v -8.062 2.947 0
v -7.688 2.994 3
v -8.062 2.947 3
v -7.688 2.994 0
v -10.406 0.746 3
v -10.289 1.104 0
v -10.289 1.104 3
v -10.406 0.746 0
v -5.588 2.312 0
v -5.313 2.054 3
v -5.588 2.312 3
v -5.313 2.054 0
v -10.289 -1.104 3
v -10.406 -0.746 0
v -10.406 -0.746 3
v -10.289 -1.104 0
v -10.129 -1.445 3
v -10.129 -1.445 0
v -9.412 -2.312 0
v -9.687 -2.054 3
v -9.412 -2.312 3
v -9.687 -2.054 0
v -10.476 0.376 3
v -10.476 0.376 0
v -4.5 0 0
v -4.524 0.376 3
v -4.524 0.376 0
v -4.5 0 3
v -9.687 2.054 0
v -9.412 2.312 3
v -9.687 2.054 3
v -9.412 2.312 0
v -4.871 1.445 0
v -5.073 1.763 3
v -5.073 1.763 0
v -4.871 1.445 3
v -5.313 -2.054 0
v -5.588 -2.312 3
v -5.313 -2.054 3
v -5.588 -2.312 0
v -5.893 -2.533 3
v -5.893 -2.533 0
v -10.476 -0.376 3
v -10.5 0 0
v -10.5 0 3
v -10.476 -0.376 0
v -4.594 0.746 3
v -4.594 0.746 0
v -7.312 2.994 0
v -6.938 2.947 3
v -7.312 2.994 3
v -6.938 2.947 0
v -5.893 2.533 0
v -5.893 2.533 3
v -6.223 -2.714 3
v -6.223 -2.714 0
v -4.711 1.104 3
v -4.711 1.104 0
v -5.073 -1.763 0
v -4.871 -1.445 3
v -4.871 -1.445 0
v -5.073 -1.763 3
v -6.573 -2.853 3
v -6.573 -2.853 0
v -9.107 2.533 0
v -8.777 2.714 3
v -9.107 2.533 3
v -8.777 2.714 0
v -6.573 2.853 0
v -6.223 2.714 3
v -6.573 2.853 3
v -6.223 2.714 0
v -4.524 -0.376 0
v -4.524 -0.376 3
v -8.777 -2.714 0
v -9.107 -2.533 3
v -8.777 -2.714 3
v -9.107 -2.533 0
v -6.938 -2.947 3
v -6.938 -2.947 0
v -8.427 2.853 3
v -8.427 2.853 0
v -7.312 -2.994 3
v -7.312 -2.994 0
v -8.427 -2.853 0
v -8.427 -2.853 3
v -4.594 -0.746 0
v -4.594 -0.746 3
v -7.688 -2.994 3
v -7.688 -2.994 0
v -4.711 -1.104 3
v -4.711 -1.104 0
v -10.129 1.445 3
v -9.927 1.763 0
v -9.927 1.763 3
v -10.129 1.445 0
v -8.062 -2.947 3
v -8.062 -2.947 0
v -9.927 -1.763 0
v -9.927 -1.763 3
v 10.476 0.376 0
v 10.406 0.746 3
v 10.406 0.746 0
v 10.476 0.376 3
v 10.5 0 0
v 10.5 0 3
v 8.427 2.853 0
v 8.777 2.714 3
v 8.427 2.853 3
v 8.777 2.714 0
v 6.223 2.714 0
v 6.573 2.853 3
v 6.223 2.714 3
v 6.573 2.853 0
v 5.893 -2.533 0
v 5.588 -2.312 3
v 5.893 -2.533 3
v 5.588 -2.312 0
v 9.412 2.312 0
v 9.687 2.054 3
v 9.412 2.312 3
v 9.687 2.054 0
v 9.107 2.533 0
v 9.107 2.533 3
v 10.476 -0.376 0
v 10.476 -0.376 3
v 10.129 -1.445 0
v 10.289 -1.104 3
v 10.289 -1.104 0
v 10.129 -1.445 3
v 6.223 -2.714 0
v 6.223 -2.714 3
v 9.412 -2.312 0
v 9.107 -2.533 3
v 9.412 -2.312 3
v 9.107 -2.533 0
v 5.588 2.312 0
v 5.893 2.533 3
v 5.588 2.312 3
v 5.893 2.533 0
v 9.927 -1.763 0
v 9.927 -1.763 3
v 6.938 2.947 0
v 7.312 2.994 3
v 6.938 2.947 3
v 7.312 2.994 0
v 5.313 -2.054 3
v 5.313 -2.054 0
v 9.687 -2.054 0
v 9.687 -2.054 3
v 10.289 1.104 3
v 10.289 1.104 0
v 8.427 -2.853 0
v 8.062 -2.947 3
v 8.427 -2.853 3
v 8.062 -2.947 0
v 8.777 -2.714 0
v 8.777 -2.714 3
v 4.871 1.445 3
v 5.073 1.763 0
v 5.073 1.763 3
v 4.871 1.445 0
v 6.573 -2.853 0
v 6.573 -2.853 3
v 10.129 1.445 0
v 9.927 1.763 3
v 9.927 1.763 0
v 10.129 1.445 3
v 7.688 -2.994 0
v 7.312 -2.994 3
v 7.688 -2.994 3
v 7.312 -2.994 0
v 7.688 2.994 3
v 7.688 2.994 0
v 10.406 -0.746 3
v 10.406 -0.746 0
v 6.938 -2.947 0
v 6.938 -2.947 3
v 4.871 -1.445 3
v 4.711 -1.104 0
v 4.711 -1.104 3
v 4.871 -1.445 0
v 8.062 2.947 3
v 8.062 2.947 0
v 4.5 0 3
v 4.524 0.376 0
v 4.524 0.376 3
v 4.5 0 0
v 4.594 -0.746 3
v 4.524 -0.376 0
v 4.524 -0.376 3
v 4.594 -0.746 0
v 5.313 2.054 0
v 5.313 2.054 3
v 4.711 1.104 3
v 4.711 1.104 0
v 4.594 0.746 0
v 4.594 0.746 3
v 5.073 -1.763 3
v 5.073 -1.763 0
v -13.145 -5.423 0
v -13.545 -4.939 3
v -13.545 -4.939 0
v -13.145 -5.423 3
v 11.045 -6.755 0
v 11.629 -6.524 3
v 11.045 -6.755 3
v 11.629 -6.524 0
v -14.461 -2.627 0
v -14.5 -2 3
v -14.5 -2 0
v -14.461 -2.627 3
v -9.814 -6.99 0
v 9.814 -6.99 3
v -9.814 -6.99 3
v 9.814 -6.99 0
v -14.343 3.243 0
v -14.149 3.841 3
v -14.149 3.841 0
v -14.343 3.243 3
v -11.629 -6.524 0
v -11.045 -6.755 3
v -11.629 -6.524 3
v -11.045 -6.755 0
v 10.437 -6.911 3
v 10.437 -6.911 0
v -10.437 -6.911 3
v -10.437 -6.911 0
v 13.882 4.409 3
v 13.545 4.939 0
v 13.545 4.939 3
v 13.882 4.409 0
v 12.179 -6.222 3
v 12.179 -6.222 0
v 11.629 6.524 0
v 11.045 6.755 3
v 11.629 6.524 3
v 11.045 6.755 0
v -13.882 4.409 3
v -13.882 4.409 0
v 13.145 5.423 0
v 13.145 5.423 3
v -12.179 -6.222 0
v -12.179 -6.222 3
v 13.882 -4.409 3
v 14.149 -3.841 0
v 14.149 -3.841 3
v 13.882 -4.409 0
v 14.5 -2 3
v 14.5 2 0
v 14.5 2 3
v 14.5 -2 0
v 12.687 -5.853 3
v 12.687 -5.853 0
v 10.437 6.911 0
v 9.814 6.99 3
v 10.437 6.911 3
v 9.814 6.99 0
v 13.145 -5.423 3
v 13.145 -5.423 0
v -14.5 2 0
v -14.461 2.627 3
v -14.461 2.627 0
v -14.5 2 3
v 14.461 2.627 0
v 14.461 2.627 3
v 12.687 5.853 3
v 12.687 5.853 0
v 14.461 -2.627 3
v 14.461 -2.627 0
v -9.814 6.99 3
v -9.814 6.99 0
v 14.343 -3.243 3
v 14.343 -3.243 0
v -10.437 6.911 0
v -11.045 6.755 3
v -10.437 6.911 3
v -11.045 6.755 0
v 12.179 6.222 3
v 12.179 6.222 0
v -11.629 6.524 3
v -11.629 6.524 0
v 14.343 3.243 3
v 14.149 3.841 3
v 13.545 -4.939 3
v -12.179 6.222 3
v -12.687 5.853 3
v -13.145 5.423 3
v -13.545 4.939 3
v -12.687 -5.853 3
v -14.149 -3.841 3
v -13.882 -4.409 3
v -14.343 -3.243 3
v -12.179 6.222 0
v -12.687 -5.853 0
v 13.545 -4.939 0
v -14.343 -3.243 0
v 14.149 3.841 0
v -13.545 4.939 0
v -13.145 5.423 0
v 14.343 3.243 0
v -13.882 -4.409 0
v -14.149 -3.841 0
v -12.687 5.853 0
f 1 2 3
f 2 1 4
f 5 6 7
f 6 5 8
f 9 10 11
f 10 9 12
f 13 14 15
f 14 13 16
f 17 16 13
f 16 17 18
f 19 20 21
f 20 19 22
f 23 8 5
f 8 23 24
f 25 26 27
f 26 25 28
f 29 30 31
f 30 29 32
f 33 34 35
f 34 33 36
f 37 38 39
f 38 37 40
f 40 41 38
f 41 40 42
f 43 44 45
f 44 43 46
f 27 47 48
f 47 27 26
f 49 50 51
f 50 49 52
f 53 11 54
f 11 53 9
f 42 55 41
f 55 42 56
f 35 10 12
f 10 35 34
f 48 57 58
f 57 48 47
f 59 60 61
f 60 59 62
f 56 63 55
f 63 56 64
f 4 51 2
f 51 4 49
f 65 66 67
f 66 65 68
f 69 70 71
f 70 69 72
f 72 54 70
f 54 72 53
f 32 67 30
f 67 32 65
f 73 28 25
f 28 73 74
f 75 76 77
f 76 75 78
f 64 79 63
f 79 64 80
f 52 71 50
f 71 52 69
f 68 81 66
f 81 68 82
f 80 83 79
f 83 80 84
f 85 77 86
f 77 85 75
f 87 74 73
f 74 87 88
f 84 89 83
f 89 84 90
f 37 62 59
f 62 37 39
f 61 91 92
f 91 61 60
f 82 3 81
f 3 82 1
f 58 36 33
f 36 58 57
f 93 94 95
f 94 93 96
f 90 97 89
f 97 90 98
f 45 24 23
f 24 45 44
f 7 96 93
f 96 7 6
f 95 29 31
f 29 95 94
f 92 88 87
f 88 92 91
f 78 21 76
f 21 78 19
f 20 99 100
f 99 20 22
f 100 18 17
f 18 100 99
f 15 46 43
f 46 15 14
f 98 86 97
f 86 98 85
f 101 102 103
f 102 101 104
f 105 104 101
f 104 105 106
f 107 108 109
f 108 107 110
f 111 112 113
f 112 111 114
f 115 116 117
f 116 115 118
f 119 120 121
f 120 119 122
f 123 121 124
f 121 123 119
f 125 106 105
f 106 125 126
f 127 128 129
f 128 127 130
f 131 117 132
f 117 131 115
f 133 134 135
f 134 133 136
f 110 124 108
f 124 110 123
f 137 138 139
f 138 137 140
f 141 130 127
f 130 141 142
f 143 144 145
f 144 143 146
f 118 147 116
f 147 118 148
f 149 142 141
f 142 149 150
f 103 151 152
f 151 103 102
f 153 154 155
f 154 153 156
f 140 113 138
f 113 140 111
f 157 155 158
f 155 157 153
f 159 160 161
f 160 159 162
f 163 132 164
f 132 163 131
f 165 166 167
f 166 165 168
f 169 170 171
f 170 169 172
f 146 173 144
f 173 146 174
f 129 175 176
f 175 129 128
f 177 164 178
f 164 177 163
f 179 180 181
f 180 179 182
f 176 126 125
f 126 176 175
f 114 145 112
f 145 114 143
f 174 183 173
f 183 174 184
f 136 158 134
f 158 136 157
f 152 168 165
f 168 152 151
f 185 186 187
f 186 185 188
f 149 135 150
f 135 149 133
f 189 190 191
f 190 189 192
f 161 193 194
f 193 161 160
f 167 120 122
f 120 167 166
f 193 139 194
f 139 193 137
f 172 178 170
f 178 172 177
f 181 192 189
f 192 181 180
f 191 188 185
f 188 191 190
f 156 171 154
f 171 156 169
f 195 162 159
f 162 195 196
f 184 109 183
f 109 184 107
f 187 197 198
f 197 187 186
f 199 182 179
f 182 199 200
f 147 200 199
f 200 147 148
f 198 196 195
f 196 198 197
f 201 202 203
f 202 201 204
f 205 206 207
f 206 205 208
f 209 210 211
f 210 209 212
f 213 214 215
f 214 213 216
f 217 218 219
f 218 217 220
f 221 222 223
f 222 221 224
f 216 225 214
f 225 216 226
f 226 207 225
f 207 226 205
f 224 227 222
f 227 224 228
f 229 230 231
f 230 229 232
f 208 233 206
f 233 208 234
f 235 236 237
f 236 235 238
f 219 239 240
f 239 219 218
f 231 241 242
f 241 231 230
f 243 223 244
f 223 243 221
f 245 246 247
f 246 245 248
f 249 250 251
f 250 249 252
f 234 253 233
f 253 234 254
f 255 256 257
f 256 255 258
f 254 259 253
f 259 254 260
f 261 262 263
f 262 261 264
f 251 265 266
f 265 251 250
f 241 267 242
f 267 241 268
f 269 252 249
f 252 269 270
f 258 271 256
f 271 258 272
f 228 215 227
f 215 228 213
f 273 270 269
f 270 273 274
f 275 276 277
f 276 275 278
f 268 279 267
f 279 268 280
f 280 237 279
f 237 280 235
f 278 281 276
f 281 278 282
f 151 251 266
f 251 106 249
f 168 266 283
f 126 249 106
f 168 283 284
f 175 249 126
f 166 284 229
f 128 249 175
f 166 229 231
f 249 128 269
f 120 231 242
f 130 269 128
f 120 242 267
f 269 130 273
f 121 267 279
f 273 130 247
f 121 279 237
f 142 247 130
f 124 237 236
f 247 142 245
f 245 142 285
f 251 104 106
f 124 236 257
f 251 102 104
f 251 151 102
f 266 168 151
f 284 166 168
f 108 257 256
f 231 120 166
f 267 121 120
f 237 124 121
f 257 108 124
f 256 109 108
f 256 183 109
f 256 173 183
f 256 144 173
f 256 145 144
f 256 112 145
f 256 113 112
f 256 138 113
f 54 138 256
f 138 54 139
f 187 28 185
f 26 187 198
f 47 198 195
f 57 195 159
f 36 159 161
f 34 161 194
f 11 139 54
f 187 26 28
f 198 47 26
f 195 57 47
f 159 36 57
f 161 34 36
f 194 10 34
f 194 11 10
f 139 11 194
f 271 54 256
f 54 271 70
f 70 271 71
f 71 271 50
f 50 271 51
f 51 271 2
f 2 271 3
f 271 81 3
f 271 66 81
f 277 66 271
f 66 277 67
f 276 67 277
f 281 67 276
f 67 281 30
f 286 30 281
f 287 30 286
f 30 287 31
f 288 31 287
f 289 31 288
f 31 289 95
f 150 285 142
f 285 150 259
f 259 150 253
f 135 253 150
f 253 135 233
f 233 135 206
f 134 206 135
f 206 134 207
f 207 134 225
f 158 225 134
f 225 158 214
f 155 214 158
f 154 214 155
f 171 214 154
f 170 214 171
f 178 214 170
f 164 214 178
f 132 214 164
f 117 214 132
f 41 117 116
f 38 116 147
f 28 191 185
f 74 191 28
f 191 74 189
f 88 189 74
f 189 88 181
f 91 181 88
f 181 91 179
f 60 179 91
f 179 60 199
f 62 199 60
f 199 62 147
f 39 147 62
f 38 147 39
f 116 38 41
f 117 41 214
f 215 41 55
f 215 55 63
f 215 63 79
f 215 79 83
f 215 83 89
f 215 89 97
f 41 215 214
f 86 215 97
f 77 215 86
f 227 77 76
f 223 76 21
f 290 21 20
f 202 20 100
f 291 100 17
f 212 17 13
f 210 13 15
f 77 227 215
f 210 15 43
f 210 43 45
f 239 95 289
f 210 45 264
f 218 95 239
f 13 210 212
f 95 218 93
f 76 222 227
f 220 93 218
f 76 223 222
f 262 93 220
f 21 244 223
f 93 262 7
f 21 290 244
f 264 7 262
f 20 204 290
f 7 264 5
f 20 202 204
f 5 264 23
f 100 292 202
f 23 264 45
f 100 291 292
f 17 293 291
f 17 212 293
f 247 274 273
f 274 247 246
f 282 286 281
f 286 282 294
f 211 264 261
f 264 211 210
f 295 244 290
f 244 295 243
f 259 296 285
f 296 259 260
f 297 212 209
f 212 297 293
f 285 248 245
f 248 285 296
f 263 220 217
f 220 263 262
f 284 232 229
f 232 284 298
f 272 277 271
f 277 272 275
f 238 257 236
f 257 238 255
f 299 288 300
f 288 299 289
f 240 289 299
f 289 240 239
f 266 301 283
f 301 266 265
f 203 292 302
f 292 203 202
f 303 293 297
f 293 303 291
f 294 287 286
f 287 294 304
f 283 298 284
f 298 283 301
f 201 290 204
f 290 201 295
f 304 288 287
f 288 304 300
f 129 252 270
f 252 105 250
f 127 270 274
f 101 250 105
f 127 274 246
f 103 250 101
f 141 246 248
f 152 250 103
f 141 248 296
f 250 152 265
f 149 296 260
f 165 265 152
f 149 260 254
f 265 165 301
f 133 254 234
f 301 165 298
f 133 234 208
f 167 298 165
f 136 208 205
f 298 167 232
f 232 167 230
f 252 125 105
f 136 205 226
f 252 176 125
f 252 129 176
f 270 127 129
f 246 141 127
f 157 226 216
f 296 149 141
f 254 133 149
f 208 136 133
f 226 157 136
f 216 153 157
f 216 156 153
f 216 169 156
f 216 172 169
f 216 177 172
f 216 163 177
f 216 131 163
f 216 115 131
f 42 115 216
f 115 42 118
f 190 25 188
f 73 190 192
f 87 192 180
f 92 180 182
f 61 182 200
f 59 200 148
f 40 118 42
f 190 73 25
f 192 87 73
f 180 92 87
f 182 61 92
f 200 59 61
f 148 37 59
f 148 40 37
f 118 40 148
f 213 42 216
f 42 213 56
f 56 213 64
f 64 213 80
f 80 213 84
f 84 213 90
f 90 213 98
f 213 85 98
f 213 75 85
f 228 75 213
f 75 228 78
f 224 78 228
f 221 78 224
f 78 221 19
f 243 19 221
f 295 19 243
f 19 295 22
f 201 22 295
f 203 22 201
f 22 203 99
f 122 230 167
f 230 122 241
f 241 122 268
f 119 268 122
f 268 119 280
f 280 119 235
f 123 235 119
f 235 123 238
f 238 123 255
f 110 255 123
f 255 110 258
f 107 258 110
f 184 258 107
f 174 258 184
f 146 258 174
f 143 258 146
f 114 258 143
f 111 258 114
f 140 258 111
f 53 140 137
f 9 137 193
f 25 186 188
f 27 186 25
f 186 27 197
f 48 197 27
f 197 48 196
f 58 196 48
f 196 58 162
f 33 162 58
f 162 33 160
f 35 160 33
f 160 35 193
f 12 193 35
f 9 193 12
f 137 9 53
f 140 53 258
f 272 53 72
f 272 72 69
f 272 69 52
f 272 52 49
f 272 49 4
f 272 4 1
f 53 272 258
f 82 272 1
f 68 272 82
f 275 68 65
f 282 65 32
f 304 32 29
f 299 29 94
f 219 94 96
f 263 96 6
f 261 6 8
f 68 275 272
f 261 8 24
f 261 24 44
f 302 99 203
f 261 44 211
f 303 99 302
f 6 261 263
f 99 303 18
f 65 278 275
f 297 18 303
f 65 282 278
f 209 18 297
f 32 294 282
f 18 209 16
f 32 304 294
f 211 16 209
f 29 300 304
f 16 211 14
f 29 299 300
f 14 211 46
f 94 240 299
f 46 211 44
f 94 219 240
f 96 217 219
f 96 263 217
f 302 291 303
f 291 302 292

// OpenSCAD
$fn = 50;


difference() {
	union() {
		hull() {
			translate(v = [-9.5000000000, 2.0000000000, 0]) {
				cylinder(h = 3, r = 5);
			}
			translate(v = [9.5000000000, 2.0000000000, 0]) {
				cylinder(h = 3, r = 5);
			}
			translate(v = [-9.5000000000, -2.0000000000, 0]) {
				cylinder(h = 3, r = 5);
			}
			translate(v = [9.5000000000, -2.0000000000, 0]) {
				cylinder(h = 3, r = 5);
			}
		}
	}
	union() {
		translate(v = [-7.5000000000, 0.0000000000, -100.0000000000]) {
			cylinder(h = 200, r = 3.0000000000);
		}
		translate(v = [-7.5000000000, 0.0000000000, -100.0000000000]) {
			cylinder(h = 200, r = 3.0000000000);
		}
		translate(v = [7.5000000000, 0.0000000000, -100.0000000000]) {
			cylinder(h = 200, r = 3.0000000000);
		}
		translate(v = [7.5000000000, 0.0000000000, -100.0000000000]) {
			cylinder(h = 200, r = 3.0000000000);
		}
	}
}
